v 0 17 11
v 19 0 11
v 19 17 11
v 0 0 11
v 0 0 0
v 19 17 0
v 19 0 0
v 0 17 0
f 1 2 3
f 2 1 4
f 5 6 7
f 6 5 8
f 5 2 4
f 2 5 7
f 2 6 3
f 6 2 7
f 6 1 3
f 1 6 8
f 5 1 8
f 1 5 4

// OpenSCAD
// Generated by SolidPython 1.0.1 on 2020-07-29 00:46:56


cube(size = [19, 17, 11]);
/***********************************************
*********      SolidPython code:      **********
************************************************
 
# import packages: SolidPython
from solid import *
from solid.utils import *
from itertools import chain, combinations, permutations


class Resize:

    def __init__(self, scad_file):
        self.scad_file = scad_file
        #self.scad_file = import_scad(scad_file)
        # cone/cylinder param:
        self.r1 = 0
        self.r2 = 0
        self.h = 0
        # rectangular prism param:
        self.w = 0
        self.l = 0
        # ellipse param:
        self.r = 0

    # import OpenScad code (file name corresponds to shape)


    # classify shape + parameters
    def assign(self, param1, param2, param3):
        if self.scad_file == 'cone.scad':
            self.r1 = param1
            self.r2 = param2
            self.h = param3
        elif self.scad_file == 'cylinder.scad':
            self.r1 = param1
            self.r2 = param2
            self.h = param3
        elif self.scad_file == 'rectangularPrism.scad':
            self.h = param1
            self.l = param2
            self.w = param3
        else:
            self.r = param1
            self.h = param2

    # resize parameters
    def iterate(self):
        x = range(3, 20, 2)
        i = 1
        if self.scad_file == 'cone.scad':
            tempList = list(permutations(x, 2))
            for temp in tempList:
                param1 = temp[0]
                param2 = temp[1]
                filepath = 'produced_scad_files/' + 'cone' + str(param1) + '_' + str(param2) + '_' + '.scad'
                scad_render_to_file(cylinder(h=param1, r1=param2, r2=0), filepath)

        elif self.scad_file == 'cylinder.scad':
            tempList = list(permutations(x, 3))
            for temp in tempList:
                param1 = temp[0]
                param2 = temp[1]
                filepath = 'produced_scad_files/' + 'cylinder' + str(param1) + '_' + str(param2) + '_' + '.scad'
                scad_render_to_file(cylinder(h=param1, r1=param2, r2=param2), filepath)

        elif self.scad_file == 'rectangularPrism.scad':
            tempList = list(permutations(x, 3))
            for temp in tempList:
                param1 = temp[0]
                param2 = temp[1]
                param3 = temp[2]
                filepath = 'produced_scad_files/' + 'rectangularPrism' + str(param1) + '_' + str(param2) + '_' + str(
                    param3) + '.scad'
                scad_render_to_file(cube(size=(param1, param2, param3)), filepath)

        elif self.scad_file == 'ellipse.scad':
            tempList = list(permutations(x, 4))
            for temp in tempList:
                param1 = temp[0]
                param2 = temp[1]
                param3 = temp[2]
                param4 = temp[3]
                filepath = 'produced_scad_files/' + 'ellipse' + str(param1) + '_' + str(param2) + '_' + str(param3) + '_' + str(param4) + '.scad'
                scad_render_to_file(scale([param1, param2, param3])(sphere(r=param4)), filepath)

    def render_to_scadfile(self):
        scad_render_to_file(scad, 'example.scad') 
 
************************************************/
